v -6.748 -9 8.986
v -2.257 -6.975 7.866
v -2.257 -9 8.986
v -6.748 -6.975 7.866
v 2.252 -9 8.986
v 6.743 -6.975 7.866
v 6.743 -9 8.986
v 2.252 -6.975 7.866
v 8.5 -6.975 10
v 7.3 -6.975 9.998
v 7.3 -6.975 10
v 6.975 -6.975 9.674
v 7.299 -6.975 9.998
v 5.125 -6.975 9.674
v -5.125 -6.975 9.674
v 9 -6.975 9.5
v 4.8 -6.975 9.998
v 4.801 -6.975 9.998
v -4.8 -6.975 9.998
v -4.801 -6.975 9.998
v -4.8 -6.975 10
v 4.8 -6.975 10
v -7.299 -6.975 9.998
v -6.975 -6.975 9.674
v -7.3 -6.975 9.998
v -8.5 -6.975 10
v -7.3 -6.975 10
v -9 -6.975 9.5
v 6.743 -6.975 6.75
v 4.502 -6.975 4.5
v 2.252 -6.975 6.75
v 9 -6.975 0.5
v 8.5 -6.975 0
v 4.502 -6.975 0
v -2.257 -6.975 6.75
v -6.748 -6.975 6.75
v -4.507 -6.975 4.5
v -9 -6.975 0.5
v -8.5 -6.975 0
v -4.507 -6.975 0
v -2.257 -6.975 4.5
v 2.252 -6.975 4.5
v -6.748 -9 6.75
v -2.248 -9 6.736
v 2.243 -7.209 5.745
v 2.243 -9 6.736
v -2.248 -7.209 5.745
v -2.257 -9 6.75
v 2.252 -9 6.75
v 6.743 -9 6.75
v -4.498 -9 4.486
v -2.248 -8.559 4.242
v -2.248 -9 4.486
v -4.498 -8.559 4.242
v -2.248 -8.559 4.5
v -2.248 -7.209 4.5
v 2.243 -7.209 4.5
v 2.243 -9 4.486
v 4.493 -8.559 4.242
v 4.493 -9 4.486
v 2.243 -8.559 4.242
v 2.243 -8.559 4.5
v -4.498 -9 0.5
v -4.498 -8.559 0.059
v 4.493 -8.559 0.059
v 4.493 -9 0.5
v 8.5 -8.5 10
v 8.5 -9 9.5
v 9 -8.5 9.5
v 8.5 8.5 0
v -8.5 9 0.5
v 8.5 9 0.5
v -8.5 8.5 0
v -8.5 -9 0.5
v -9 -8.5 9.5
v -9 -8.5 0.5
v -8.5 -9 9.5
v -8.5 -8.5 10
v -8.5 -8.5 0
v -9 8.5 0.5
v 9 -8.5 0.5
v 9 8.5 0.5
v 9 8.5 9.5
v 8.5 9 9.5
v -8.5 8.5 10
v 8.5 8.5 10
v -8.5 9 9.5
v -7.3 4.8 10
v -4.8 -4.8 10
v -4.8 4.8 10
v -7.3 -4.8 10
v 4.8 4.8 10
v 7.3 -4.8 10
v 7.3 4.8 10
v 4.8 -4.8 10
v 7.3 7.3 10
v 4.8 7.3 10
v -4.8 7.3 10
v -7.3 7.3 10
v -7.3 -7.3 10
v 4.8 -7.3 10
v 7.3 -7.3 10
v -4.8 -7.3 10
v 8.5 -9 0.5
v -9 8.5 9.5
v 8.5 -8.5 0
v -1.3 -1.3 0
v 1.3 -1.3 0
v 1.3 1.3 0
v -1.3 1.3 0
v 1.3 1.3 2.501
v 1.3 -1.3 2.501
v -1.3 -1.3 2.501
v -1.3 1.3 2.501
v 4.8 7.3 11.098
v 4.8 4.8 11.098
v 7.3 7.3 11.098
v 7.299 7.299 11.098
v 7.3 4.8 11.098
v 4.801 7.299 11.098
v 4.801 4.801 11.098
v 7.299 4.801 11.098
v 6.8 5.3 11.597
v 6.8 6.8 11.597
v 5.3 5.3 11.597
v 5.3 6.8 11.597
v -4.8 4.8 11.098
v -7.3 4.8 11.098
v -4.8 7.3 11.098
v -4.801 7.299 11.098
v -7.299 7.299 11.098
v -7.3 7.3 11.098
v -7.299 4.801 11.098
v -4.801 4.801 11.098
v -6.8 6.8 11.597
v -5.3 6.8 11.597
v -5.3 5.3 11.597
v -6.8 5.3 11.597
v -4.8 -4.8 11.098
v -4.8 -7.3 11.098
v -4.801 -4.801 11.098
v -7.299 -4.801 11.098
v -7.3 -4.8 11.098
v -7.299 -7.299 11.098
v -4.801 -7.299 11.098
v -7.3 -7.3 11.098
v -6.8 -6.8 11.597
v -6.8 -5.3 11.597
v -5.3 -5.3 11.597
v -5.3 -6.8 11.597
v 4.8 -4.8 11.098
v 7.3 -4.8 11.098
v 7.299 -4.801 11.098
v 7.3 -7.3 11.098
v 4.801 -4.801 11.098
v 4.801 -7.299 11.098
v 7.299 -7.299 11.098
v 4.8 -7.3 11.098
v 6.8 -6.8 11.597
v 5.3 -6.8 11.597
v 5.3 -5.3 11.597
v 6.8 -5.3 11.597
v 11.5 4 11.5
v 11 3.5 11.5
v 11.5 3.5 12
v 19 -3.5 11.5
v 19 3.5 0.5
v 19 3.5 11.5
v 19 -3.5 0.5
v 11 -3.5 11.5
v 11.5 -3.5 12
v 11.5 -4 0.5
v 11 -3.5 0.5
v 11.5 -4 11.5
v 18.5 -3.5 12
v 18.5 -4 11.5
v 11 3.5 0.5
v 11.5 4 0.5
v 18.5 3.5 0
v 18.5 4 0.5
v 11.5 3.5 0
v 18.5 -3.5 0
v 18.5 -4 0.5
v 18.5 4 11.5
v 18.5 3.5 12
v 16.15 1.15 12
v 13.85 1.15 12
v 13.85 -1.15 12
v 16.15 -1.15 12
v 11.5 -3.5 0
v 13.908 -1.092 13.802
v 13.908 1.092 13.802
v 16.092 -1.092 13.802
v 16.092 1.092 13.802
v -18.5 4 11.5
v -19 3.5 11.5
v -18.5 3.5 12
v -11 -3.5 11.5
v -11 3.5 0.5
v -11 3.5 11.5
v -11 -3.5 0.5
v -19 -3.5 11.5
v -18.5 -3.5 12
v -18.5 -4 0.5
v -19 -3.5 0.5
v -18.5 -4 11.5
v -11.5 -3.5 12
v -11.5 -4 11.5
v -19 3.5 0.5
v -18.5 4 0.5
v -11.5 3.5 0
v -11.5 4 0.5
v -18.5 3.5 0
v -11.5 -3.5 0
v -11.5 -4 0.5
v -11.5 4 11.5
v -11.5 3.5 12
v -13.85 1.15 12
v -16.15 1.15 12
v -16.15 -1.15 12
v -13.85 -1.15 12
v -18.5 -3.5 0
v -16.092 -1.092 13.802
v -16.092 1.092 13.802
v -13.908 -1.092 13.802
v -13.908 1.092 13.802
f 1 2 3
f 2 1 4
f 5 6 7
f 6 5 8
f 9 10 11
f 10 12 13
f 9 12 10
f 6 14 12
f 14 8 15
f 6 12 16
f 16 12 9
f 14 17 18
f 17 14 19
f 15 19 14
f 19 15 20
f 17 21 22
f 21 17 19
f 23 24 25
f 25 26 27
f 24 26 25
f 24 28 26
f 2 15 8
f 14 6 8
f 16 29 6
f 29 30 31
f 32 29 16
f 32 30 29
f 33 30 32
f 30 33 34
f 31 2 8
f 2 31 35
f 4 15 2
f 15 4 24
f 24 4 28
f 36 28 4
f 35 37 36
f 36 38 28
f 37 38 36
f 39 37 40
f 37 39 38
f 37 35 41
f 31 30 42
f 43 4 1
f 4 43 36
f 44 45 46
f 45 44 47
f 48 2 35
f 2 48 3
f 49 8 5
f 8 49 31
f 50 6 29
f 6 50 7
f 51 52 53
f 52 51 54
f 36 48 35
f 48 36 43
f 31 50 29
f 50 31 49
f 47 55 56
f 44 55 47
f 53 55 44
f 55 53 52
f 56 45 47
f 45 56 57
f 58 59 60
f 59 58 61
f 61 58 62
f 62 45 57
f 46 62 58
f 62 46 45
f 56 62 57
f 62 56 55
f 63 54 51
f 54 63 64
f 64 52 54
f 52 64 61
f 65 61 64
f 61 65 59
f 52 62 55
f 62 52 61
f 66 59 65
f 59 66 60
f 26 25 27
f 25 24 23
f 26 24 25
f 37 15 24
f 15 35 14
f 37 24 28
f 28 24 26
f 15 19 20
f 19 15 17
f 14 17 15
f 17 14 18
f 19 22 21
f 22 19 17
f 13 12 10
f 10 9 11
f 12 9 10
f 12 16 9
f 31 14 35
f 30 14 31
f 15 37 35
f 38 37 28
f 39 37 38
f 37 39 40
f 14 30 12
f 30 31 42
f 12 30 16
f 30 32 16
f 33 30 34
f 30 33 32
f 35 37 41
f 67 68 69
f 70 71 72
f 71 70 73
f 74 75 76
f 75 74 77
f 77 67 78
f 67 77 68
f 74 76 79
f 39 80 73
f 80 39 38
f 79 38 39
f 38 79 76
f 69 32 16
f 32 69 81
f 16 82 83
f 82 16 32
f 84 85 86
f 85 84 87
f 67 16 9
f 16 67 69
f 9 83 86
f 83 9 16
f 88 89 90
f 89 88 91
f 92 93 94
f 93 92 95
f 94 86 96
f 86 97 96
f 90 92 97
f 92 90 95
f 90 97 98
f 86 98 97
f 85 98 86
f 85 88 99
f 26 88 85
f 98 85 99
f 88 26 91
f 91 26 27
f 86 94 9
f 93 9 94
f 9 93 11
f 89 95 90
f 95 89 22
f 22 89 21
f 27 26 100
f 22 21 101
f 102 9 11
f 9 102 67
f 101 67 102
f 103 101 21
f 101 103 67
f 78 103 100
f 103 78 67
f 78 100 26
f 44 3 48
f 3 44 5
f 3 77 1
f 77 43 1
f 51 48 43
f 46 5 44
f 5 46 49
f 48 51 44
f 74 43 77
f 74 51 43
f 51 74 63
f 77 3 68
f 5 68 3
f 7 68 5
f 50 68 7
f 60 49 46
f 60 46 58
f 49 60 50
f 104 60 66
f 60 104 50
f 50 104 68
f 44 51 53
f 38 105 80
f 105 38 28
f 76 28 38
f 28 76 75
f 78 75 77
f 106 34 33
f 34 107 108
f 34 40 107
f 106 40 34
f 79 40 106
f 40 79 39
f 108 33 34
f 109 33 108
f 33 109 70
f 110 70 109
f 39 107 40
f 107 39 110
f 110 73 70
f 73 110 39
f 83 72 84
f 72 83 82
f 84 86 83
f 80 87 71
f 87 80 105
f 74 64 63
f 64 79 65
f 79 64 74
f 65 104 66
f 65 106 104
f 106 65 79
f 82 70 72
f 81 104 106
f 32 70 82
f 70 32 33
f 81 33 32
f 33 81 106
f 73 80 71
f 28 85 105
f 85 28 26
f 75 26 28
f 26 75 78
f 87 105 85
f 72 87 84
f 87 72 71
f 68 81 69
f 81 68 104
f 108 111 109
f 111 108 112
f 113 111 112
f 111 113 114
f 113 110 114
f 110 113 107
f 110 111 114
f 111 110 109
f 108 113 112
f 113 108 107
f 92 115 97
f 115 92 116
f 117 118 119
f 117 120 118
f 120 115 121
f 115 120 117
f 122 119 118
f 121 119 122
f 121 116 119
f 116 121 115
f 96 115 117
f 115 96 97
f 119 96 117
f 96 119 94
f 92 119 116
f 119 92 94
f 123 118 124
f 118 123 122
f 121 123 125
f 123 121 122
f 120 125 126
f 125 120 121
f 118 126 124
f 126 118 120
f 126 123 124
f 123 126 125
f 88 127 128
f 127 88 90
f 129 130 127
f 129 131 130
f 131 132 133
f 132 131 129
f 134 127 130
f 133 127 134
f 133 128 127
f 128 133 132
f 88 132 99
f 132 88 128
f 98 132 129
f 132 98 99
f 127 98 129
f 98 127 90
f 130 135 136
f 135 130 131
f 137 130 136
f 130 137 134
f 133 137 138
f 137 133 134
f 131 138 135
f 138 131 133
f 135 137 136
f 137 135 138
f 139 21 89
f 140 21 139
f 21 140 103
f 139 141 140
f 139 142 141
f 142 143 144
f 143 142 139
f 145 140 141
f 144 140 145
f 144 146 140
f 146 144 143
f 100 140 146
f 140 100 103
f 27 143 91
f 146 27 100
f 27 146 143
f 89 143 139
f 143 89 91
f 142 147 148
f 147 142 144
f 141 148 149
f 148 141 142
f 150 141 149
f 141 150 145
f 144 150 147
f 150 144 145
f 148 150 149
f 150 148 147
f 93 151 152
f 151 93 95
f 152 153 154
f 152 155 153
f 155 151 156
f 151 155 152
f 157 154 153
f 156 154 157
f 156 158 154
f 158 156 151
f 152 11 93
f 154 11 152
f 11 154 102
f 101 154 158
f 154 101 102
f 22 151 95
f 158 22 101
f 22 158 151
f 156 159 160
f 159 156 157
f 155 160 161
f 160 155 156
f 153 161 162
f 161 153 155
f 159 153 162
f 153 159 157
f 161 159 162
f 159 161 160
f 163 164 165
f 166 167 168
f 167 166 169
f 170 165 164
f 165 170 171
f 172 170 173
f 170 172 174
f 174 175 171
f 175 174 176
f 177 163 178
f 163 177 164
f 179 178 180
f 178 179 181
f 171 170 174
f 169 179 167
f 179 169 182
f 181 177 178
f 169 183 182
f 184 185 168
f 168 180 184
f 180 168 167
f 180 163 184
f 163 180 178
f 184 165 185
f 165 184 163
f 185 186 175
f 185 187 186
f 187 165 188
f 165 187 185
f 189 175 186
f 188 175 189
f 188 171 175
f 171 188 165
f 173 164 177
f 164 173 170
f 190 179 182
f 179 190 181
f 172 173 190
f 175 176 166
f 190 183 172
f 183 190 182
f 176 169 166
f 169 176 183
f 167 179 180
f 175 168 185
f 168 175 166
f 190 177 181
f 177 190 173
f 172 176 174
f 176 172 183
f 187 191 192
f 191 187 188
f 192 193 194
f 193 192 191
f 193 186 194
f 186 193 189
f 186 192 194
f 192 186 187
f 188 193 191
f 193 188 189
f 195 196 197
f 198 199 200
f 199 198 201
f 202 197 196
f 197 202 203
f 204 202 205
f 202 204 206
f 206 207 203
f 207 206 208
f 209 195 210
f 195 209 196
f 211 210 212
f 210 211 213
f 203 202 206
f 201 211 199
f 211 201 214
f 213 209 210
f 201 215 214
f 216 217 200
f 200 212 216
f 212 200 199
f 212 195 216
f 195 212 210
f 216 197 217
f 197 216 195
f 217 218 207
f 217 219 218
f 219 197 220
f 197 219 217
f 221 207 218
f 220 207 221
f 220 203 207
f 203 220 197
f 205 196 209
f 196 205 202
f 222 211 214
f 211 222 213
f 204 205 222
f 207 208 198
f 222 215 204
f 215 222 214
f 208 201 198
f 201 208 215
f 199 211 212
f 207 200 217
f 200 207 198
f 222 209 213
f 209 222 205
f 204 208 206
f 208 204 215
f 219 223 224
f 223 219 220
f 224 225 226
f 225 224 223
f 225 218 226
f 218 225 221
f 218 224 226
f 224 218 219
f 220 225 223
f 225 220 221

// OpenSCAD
// file: common.scad
// Unless otherwise specified, each resulting shape is
// resting on the XY plane, centered on the Z axis.

// A small amount to make sure shapes overlap when needed. This
// is well below the resolution of my 3D printer, so it
// shouldn't affect the final result.
eps = 0.001;

// High quality for printing.
$fa = 5;
$fs = 0.4;

module repeatx(n, spacing) {
  for (i = [1:n])
    translate([(i-1)*spacing, 0, 0])
      children();
}

module repeaty(n, spacing) {
  for (i = [1:n])
    translate([0, (i-1)*spacing, 0])
      children();
}

// A square pyramid, 1mm wide and 0.5mm tall. Each side of
// the base is centered on an axis.
module pyramid() {
  linear_extrude(0.5, scale=0)
    square(1, center=true);
}

// A regular octahedron centered on the origin with its
// vertices on the axes. 'axis' gives its full length along
// each axis.
module octahedron(axis) {
  // Top and bottom halves.
  for (a = [-1, 1])
    scale([1, 1, a])
      // Extrude a square into a pyramid.
      linear_extrude(axis/2, scale=0)
        rotate([0, 0, 45])
          square(norm([axis/2, axis/2]), center=true);
}

// 'd' is the outer dimensions of the box.
module chamfered_box(d, chamfer=0.5) {
  assert(d.x >= chamfer*2);
  assert(d.y >= chamfer*2);
  assert(d.z >= chamfer*2);

  // Raise the result up so it is resting on the XY plane.
  translate([0, 0, d.z/2]) {
    minkowski() {
      // The desired cube, scaled back by the chamfer distance
      // in all directions.
      cube(d - [chamfer*2, chamfer*2, chamfer*2], center=true);
      octahedron(chamfer*2);
    }
  }
}

module chamfered_disk(height, radius) {
  // Chamfer base disks and chips more aggressively.
  chamfer = 1.1;
  assert(radius >= chamfer);
  assert(height >= chamfer*2);

  // Raise the result up so it is resting on the XY plane.
  translate([0, 0, height/2]) {
    minkowski() {
      // The desired disk, scaled back by the chamfer distance
      // in all directions.
      cylinder(height-chamfer*2, r=radius-chamfer, center=true);
      
      // A pair of cones.
      for (a = [-1, 1])
        scale([1, 1, a])
          linear_extrude(chamfer, scale=0)
            circle(chamfer);
    }
  }
}

locking_lug_dims = [2.3, 2.3, 1.8+2*eps];

// A snug fit for gluing.
module locking_lug() {
  // Taper the lug slightly, to counteract the printing effect
  // which spreads the top layer slightly.
  linear_extrude(locking_lug_dims.z, scale=0.95)
    square([locking_lug_dims.x, locking_lug_dims.y],
            center=true);
}

// Make extra sure the lug will fit all the way into the hole.
locking_socket_extra_depth = 0.7;

module locking_socket_top() {
  extra_depth = 0.15;
  translate([
    0, 0,
    -(
       locking_lug_dims.z+locking_socket_extra_depth+extra_depth
    )/2+eps
  ]) {
    cube(locking_lug_dims + [
      0.15, 0.15,
      locking_socket_extra_depth+extra_depth
    ], center=true);
  }
}

module locking_socket_bottom() {
  translate([
    0, 0,
    (locking_lug_dims.z+locking_socket_extra_depth)/2-eps
  ]) {
    cube(locking_lug_dims + [
      // When printing this on the bottom of a model, it
      // needs to be a bit wider to account for
      // elephant-foot.
      0.3, 0.3,
      locking_socket_extra_depth
    ], center=true);
  }
}

// A pin which can be used to join two locking sockets.
module locking_pin() {
  dims = [
    locking_lug_dims.x-0.2,
    // Lay the pin on its side for more reliable printing.
    locking_lug_dims.z*2 + locking_socket_extra_depth/2,
    locking_lug_dims.y-0.2,
  ];
  translate([0, 0, dims.z/2]) {
    difference() {
      cube(dims, center=true);
      
      // A slight bottom chamfer to combat elephant-foot.
      for (a = [-1, 1])
        scale([a, 1, 1])
          translate([dims.x/2, -eps, -dims.z/2-1.3])
            rotate([0, 45, 0])
              cube([dims.x, dims.y+3*eps, dims.z], center=true);
    }
  }
}

// Arranges children in square pattern.
module arrange(spacing) {
  s = ceil(sqrt($children));
  for (a = [0:s-1], b = [0:s-1]) {
    c = a + b*s;
    x = a - s/2 + 0.5;
    y = b - s/2 + 0.5;
    if (c < $children)
      translate([x*spacing, y*spacing, 0])
        children(c);
  }
}
// file: head.scad
include <common.scad>

// Studs are 1.6mm high and 2.5mm across.
stud_width = 2.5;

// Studs are spaced 1.7mm in from the edges of an 18x18mm
// square.
stud_inset = 1.7;

// 45 degree beveled top, 0.5mm high.
module stud_top(dims) {
  hull() {
    for (a = [-1, 1], b = [-1, 1]) {
      translate([
        a*(dims.x/2-0.5), b*(dims.y/2-0.5), 0
      ]) {
        pyramid();
      }
    }
  }
}

module stud_piece(dims, column_height) {
  assert(dims.x >= 1);
  assert(dims.y >= 1);
  
  // Rectangular column.
  translate([0, 0, -eps])
    linear_extrude(column_height)
      square(dims, center=true);
  
  // Beveled top.
  translate([0, 0, column_height-2*eps])
    stud_top(dims);
  
  // Beveled bottom, in case any material under the stud
  // is etched away (by the face mask, for instance).
  scale([1, 1, -1])
    stud_top(dims);
}

NO_STUD = 0;
SMALL_STUD = 1;
SMALL_SHORT_STUD = 2;
LARGE_STUD = 3;
LARGE_SHORT_STUD = 4;

module stud(type=NO_STUD) {
  if (type == NO_STUD) {
    // Nothing.
    
  } else if (type == SMALL_STUD ||
             type == SMALL_SHORT_STUD) {
    c = type == SMALL_STUD ? 1.1 : 0;
    stud_piece([stud_width, stud_width], c);
    
  } else if (type == LARGE_STUD ||
             type == LARGE_SHORT_STUD) {
    c = type == LARGE_STUD ? 1.1 : 0;

    // Build an L-shaped stud out of two elongated pieces.
    translate([0, -stud_width/2, 0])
      stud_piece([stud_width, stud_width*2], c);
    translate([-stud_width/2, 0, 0])
      stud_piece([stud_width*2, stud_width], c);
    
  } else {
    assert(false, "bad stud type");
  }
}

module four_studs() {
  displacement = (18/2)-(stud_width/2)-stud_inset;  
  for (a = [0:3])
    rotate([0, 0, a*90])
      translate([displacement, displacement, 0])
        children();
}

// A stackable box, 18x18mm, with optional studs and holes.
module stackable_box(
  height, stud_type=NO_STUD, hole_type=NO_STUD
) {
  translate([0, 0, height - eps]) {
    four_studs()
      stud(stud_type);
  }

  difference() {
    chamfered_box([18, 18, height]);
    
    if (hole_type != NO_STUD) {
      four_studs() {
        // This check is required because minkowski() returns
        // a nonempty result if just one of its arguments is
        // empty.
        minkowski() {
          stud(hole_type);
          sphere(r=0.5, $fn=10);
        }
      }
    }
  }
}

// A head, which is intended to have 2 chips stacked on top.
module head(face_raster, tall=false) {
  difference() {
    // A 10mm head plus two 3.5mm chips comes to 17mm,
    // which is slightly less than the 18mm width. That's
    // by design. It looks better not to have such tall 
    // heads, perhaps because the studs on top give the
    // illusion of added height.
    chamfered_box([18, 18, tall ? 12 : 10]);
    
    // Bring the mask out a bit extra to avoid having it 
    // intersect the studs at all.
    translate([0, -9, 0])
      face(face_raster);
    
    // A socket for gluing to a body.
    locking_socket_bottom();
  }
  
  // Add the studs separately, so they are not gouged by
  // the face engraving.
  translate([0, 0, (tall ? 12 : 10) - eps]) {
    four_studs()
      stud(SMALL_STUD);
  }
}

// 'raster' is an array of 5 rows, where each row has 8
// elements. Each element should be in [0, 1]. A '1' means the
// given position will be fully engraved on the face.
// Returns a mask which should be subtracted from the head.
// The Z axis will coincide with the centerline of the 
// mask's front.
module face(raster) {
  // Below we use a unit of 1 to represent one pixel on
  // the face. Scale up to an 18mm face, 8 pixels wide.
  scale([2.25, 2.25, 2.25]) {
    translate([-4, -eps, -eps]) {
      difference() {
        // Begin with a filled-in face plate.
        translate([-eps, -eps, -eps])
          cube([8+2*eps, 0.9+2*eps, 5+2*eps]);
        
        // Subtract the material which needs to remain on the
        // head. Leave some support under each shelf.
        for (r = [0:4])
          for (c = [0:7])
            translate([c-eps, raster[r][c]-eps, 4-r-eps])
              rotate([90, 0, 90])
                translate([0, 0, -2*eps])
                  linear_extrude(1+4*eps)
                    polygon([
                      [   -2*eps,     -2*eps],
                      [0.9+2*eps, -0.5-2*eps],
                      [0.9+2*eps,    1+2*eps],
                      [   -2*eps,    1+2*eps],
                    ]);
      }
    }
  }
}

module creeper_head() {
  head([
    [0, 1, 1, 0, 0, 1, 1, 0],
    [0, 1, 1, 0, 0, 1, 1, 0],
    [0, 0, 0, 1, 1, 0, 0, 0],
    [0, 0, 1, 1, 1, 1, 0, 0],
    [0, 0, 1, 0, 0, 1, 0, 0],
  ]);
}

module zombie_head() {
  head([
    [0.0, 0.0, 0.0, 0.0, 0.0, 0.0, 0.0, 0.0],
    [0.0, 1.0, 1.0, 0.0, 0.0, 1.0, 1.0, 0.0],
    [0.0, 0.0, 0.0, 0.8, 0.8, 0.0, 0.0, 0.0],
    [0.0, 0.0, 0.2, 0.2, 0.2, 0.2, 0.0, 0.0],
    [0.0, 0.0, 0.2, 0.2, 0.2, 0.2, 0.0, 0.0],
  ]);
}

module skeleton_head() {
  head([
    [0, 0, 0, 0, 0, 0, 0, 0],
    [0, 1, 1, 0, 0, 1, 1, 0],
    [0, 0, 0, 1, 1, 0, 0, 0],
    [0, 1, 1, 1, 1, 1, 1, 0],
    [0, 0, 0, 0, 0, 0, 0, 0],
  ]);
}

module spider_head() {
  head([
    [1, 0, 0, 0, 0, 0, 0, 1],
    [1, 0, 1, 1, 1, 1, 0, 1],
    [0, 0, 1, 1, 1, 1, 0, 0],
    [0, 0, 0, 0, 0, 0, 0, 0],
    [0, 0, 1, 0, 0, 1, 0, 0],
  ]);
}

module hero_head() {
  head([
    [0, 0, 0, 0, 0, 0, 0, 0],
    [0, 0.7, 1, 0, 0, 1, 0.7, 0],
    [0, 0, 0, 0.8, 0.8, 0, 0, 0],
    [0, 0, 1, 0, 0, 1, 0, 0],
    [0, 0, 1, 1, 1, 1, 0, 0],
  ]);
}

module enderman_head() {
  head([
    [0, 0, 0, 0, 0, 0, 0, 0],
    [1, 1, 1, 0, 0, 1, 1, 1],
    [0, 0, 0, 0, 0, 0, 0, 0],
    [0, 0, 0, 0, 0, 0, 0, 0],
    [0, 0, 0, 0, 0, 0, 0, 0],
  ]);
}

module evoker_head() {
  head([
    [0, 0, 0, 0, 0, 0, 0, 0],
    [0, 0.7, 1, 0, 0, 1, 0.7, 0],
    [0, 0, 0, 0, 0, 0, 0, 0],
    [0, 0, 0.4, 0, 0, 0.4, 0, 0],
    [0, 0, 0.4, 0, 0, 0.4, 0, 0],
  ], tall=true);
  
  // Nose.
  translate([0, -9.5, 0])
    chamfered_box([4.5, 4, 6]);
  
  // Eyebrows.
  difference() {
    translate([-8.5, -9+eps, 9])
      rotate([90, 0, 0])
        rotate([0, 90, 0])
          linear_extrude(17)
            polygon([
              [0, 0],
              [-1.3, 1],
              [-1, 2.5],
              [1, 3],
            ]);
    
    // Cut out a space between the two eyebrows.
    cube([4.5, 100, 100], center=true);
  }
}

// Heavy armor cannot stack on a heavy weapon.
module light_weapon() {
  stackable_box(3.5, SMALL_STUD, SMALL_STUD);
}
module heavy_weapon() {
  stackable_box(3.5, LARGE_STUD, SMALL_STUD);
}
module light_armor() {
  stackable_box(3.5, SMALL_SHORT_STUD, LARGE_STUD);
}
module heavy_armor() {
  stackable_box(3.5, LARGE_SHORT_STUD, SMALL_STUD);
}

// Status effect chips go between the weapon and head.
// So their top and bottom match the head's top.
module status_effect() {
  stackable_box(3.5, SMALL_STUD, SMALL_STUD);
}
// file: body.scad
include <common.scad>
use <base.scad>
use <head.scad>

arm_girth = 8;
arm_length = 12;

torso_breadth = 18;
torso_thickness = 10;
torso_height = 18;

leg_height = 13;
leg_girth = 9;

ARM_DOWN = 1;
ARM_DOWN_FUSED = 2;
ARM_OUTSTRETCHED = 3;
ARM_RAISED = 4;

module basic_body(
  arms=[ARM_DOWN, ARM_DOWN],
  bony=false,
  tall=false,
) {
  actual_leg_height = leg_height + (tall ? 17 : 0);
  // Enderman have a shorter torso to accentuate the tall legs.
  actual_torso_height = torso_height - (tall ? 4 : 0);
  
  difference() {
    union() {
      // Torso.
      if (bony) {
        // Ribs.
        for (a = [0:2])
          translate([0, 0, a*actual_torso_height/5])
            chamfered_box([
              torso_breadth,
              torso_thickness,
              actual_torso_height/5
            ]);
        // The rest of the torso is narrower.
        chamfered_box([
          torso_breadth-4,
          torso_thickness-3,
          actual_torso_height
        ]);
      } else {
        chamfered_box(
          [torso_breadth, torso_thickness, actual_torso_height]);
      }

      // Shoulders.
      for (a = [-1, 1]) {
        scale([a, 1, 1]) {
          arm_type = arms[(a+1)/2];
          translate([torso_breadth/2, 0, 0])
            rotate([0, arm_type == ARM_RAISED ? -45 : 0, 0])
              translate([arm_girth/2, 0, 0])
                chamfered_box([
                  arm_girth+1+2*eps,
                  arm_girth,
                  arm_girth,
                ]);
        }
      }

      // Legs.
      for (a = [-1, 1]) {
        scale([a, 1, 1]) {
          translate([leg_girth/2, 0, actual_torso_height]) {
            hull() {
              chamfered_box(
                [leg_girth, leg_girth, actual_leg_height]);
              translate([0, 0, -2])
                cube(1, center=true);
            }
          }
        }
      }
      
      // Fill the gap between the tops of the legs.
      translate([0, 0, actual_torso_height])
        cube([2, leg_girth-3, 2], center=true);
    }
    
    // Head locking socket.
    locking_socket_bottom();
    
    // Arm locking sockets.
    for (a = [-1, 1]) {
      scale([a, 1, 1]) {
        arm_type = arms[(a+1)/2];
        
        if (arm_type == ARM_OUTSTRETCHED) {
          translate([
            (torso_breadth+arm_girth)/2,
            -arm_girth/2,
            arm_girth/2
          ])
            rotate([90, 0, 0])
              locking_socket_top();
          
        } else if (arm_type == ARM_DOWN) {
          translate([(torso_breadth+arm_girth)/2, 0, arm_girth])
            locking_socket_top();
          
        } else if (arm_type == ARM_RAISED) {
          translate([torso_breadth/2, 0, 0])
            rotate([0, arm_type == ARM_RAISED ? -45 : 0, 0])
              translate([arm_girth/2, 0, 0])
                locking_socket_bottom();
          
        } else {
          // For ARM_DOWN_FUSED, there is no need for a
          // locking socket.
        }
      }
    }
        
    // Baseplate locking socket.
    translate([0, 0, actual_torso_height+actual_leg_height])
      locking_socket_top();
  }
}

module arm(bony=false, tall=false) {
  girth = bony ? arm_girth-2 : arm_girth;
  actual_length = arm_length + (tall ? 10 : 0);
  
  chamfered_box([girth, girth, actual_length]);
  
  // Locking lug.
  translate([0, 0, actual_length])
    locking_lug();
}

module bow() {
  thickness = 3;
  piece_length = 8;

  translate([0, 0, 0])
    chamfered_box([thickness, piece_length*2, thickness]);

  for (a = [-1, 1])
    scale([1, a, 1])
      translate([0, piece_length-1, 0])
        rotate([45, 0, 0])
          translate([0, piece_length/2, -0.5])
            chamfered_box([thickness, piece_length, thickness]);
}
// file: base.scad
include <common.scad>

module ring_profile() {
  translate([12, 0, 0])
    polygon([
      [0, 0],
      [3, 0],
      [3, 0.9],
      [2.3, 1.6],
      [0.7, 1.6],
      [0, 0.9],
    ]);
}

module ring() {
  rotate_extrude(angle=360)
    ring_profile();
}

module ring_hole() {
  rotate_extrude(angle=360)
    offset(r = 0.5)
      ring_profile();
}

module base(lug=true) {
  difference() {
    union() {
      chamfered_disk(3.5, 20);
      
      // A lug for gluing a body.
      if (lug) {
        translate([0, 0, 3.5])
          locking_lug();
      }
    }
    ring_hole();
  }
}

module base_chip() {
  base(lug=false);
  translate([0, 0, 3.5])
    ring();
}

// Demo.
base_chip();
// main file
use <base.scad>
include <body.scad>
use <head.scad>

module zombie_arm() {
  arm();
}

module zombie_body() {
  basic_body(arms=[ARM_OUTSTRETCHED,ARM_OUTSTRETCHED]);
}

module zombie_preview() {
  color(c = [0.5, 0.9, 0.3]) {
    translate([0, 0, 34.5]) zombie_head();
    translate([0, 0, 44.5]) light_weapon();
    translate([0, 0, 48]) light_armor();
    translate([13, -16, 30.5])
      rotate([-90, 0, 0]) zombie_arm();
    translate([-13, -16, 30.5])
      rotate([-90, 0, 0]) zombie_arm();
  }
  color(c = [0.6, 0.0, 0.6]) {
    translate([0, 0, 0]) base();
    translate([0, 0, 34.5])
      rotate([0, 180, 0]) zombie_body();
  }
}

// 1 for body, 2 for head and arms.
resin = 2;

if (resin == 1) {
  zombie_body();
  translate([0, 27, 0]) base();
}
if (resin == 2) {
  zombie_head();
  translate([15, 0, 0]) zombie_arm();
  translate([-15, 0, 0]) zombie_arm();
}
